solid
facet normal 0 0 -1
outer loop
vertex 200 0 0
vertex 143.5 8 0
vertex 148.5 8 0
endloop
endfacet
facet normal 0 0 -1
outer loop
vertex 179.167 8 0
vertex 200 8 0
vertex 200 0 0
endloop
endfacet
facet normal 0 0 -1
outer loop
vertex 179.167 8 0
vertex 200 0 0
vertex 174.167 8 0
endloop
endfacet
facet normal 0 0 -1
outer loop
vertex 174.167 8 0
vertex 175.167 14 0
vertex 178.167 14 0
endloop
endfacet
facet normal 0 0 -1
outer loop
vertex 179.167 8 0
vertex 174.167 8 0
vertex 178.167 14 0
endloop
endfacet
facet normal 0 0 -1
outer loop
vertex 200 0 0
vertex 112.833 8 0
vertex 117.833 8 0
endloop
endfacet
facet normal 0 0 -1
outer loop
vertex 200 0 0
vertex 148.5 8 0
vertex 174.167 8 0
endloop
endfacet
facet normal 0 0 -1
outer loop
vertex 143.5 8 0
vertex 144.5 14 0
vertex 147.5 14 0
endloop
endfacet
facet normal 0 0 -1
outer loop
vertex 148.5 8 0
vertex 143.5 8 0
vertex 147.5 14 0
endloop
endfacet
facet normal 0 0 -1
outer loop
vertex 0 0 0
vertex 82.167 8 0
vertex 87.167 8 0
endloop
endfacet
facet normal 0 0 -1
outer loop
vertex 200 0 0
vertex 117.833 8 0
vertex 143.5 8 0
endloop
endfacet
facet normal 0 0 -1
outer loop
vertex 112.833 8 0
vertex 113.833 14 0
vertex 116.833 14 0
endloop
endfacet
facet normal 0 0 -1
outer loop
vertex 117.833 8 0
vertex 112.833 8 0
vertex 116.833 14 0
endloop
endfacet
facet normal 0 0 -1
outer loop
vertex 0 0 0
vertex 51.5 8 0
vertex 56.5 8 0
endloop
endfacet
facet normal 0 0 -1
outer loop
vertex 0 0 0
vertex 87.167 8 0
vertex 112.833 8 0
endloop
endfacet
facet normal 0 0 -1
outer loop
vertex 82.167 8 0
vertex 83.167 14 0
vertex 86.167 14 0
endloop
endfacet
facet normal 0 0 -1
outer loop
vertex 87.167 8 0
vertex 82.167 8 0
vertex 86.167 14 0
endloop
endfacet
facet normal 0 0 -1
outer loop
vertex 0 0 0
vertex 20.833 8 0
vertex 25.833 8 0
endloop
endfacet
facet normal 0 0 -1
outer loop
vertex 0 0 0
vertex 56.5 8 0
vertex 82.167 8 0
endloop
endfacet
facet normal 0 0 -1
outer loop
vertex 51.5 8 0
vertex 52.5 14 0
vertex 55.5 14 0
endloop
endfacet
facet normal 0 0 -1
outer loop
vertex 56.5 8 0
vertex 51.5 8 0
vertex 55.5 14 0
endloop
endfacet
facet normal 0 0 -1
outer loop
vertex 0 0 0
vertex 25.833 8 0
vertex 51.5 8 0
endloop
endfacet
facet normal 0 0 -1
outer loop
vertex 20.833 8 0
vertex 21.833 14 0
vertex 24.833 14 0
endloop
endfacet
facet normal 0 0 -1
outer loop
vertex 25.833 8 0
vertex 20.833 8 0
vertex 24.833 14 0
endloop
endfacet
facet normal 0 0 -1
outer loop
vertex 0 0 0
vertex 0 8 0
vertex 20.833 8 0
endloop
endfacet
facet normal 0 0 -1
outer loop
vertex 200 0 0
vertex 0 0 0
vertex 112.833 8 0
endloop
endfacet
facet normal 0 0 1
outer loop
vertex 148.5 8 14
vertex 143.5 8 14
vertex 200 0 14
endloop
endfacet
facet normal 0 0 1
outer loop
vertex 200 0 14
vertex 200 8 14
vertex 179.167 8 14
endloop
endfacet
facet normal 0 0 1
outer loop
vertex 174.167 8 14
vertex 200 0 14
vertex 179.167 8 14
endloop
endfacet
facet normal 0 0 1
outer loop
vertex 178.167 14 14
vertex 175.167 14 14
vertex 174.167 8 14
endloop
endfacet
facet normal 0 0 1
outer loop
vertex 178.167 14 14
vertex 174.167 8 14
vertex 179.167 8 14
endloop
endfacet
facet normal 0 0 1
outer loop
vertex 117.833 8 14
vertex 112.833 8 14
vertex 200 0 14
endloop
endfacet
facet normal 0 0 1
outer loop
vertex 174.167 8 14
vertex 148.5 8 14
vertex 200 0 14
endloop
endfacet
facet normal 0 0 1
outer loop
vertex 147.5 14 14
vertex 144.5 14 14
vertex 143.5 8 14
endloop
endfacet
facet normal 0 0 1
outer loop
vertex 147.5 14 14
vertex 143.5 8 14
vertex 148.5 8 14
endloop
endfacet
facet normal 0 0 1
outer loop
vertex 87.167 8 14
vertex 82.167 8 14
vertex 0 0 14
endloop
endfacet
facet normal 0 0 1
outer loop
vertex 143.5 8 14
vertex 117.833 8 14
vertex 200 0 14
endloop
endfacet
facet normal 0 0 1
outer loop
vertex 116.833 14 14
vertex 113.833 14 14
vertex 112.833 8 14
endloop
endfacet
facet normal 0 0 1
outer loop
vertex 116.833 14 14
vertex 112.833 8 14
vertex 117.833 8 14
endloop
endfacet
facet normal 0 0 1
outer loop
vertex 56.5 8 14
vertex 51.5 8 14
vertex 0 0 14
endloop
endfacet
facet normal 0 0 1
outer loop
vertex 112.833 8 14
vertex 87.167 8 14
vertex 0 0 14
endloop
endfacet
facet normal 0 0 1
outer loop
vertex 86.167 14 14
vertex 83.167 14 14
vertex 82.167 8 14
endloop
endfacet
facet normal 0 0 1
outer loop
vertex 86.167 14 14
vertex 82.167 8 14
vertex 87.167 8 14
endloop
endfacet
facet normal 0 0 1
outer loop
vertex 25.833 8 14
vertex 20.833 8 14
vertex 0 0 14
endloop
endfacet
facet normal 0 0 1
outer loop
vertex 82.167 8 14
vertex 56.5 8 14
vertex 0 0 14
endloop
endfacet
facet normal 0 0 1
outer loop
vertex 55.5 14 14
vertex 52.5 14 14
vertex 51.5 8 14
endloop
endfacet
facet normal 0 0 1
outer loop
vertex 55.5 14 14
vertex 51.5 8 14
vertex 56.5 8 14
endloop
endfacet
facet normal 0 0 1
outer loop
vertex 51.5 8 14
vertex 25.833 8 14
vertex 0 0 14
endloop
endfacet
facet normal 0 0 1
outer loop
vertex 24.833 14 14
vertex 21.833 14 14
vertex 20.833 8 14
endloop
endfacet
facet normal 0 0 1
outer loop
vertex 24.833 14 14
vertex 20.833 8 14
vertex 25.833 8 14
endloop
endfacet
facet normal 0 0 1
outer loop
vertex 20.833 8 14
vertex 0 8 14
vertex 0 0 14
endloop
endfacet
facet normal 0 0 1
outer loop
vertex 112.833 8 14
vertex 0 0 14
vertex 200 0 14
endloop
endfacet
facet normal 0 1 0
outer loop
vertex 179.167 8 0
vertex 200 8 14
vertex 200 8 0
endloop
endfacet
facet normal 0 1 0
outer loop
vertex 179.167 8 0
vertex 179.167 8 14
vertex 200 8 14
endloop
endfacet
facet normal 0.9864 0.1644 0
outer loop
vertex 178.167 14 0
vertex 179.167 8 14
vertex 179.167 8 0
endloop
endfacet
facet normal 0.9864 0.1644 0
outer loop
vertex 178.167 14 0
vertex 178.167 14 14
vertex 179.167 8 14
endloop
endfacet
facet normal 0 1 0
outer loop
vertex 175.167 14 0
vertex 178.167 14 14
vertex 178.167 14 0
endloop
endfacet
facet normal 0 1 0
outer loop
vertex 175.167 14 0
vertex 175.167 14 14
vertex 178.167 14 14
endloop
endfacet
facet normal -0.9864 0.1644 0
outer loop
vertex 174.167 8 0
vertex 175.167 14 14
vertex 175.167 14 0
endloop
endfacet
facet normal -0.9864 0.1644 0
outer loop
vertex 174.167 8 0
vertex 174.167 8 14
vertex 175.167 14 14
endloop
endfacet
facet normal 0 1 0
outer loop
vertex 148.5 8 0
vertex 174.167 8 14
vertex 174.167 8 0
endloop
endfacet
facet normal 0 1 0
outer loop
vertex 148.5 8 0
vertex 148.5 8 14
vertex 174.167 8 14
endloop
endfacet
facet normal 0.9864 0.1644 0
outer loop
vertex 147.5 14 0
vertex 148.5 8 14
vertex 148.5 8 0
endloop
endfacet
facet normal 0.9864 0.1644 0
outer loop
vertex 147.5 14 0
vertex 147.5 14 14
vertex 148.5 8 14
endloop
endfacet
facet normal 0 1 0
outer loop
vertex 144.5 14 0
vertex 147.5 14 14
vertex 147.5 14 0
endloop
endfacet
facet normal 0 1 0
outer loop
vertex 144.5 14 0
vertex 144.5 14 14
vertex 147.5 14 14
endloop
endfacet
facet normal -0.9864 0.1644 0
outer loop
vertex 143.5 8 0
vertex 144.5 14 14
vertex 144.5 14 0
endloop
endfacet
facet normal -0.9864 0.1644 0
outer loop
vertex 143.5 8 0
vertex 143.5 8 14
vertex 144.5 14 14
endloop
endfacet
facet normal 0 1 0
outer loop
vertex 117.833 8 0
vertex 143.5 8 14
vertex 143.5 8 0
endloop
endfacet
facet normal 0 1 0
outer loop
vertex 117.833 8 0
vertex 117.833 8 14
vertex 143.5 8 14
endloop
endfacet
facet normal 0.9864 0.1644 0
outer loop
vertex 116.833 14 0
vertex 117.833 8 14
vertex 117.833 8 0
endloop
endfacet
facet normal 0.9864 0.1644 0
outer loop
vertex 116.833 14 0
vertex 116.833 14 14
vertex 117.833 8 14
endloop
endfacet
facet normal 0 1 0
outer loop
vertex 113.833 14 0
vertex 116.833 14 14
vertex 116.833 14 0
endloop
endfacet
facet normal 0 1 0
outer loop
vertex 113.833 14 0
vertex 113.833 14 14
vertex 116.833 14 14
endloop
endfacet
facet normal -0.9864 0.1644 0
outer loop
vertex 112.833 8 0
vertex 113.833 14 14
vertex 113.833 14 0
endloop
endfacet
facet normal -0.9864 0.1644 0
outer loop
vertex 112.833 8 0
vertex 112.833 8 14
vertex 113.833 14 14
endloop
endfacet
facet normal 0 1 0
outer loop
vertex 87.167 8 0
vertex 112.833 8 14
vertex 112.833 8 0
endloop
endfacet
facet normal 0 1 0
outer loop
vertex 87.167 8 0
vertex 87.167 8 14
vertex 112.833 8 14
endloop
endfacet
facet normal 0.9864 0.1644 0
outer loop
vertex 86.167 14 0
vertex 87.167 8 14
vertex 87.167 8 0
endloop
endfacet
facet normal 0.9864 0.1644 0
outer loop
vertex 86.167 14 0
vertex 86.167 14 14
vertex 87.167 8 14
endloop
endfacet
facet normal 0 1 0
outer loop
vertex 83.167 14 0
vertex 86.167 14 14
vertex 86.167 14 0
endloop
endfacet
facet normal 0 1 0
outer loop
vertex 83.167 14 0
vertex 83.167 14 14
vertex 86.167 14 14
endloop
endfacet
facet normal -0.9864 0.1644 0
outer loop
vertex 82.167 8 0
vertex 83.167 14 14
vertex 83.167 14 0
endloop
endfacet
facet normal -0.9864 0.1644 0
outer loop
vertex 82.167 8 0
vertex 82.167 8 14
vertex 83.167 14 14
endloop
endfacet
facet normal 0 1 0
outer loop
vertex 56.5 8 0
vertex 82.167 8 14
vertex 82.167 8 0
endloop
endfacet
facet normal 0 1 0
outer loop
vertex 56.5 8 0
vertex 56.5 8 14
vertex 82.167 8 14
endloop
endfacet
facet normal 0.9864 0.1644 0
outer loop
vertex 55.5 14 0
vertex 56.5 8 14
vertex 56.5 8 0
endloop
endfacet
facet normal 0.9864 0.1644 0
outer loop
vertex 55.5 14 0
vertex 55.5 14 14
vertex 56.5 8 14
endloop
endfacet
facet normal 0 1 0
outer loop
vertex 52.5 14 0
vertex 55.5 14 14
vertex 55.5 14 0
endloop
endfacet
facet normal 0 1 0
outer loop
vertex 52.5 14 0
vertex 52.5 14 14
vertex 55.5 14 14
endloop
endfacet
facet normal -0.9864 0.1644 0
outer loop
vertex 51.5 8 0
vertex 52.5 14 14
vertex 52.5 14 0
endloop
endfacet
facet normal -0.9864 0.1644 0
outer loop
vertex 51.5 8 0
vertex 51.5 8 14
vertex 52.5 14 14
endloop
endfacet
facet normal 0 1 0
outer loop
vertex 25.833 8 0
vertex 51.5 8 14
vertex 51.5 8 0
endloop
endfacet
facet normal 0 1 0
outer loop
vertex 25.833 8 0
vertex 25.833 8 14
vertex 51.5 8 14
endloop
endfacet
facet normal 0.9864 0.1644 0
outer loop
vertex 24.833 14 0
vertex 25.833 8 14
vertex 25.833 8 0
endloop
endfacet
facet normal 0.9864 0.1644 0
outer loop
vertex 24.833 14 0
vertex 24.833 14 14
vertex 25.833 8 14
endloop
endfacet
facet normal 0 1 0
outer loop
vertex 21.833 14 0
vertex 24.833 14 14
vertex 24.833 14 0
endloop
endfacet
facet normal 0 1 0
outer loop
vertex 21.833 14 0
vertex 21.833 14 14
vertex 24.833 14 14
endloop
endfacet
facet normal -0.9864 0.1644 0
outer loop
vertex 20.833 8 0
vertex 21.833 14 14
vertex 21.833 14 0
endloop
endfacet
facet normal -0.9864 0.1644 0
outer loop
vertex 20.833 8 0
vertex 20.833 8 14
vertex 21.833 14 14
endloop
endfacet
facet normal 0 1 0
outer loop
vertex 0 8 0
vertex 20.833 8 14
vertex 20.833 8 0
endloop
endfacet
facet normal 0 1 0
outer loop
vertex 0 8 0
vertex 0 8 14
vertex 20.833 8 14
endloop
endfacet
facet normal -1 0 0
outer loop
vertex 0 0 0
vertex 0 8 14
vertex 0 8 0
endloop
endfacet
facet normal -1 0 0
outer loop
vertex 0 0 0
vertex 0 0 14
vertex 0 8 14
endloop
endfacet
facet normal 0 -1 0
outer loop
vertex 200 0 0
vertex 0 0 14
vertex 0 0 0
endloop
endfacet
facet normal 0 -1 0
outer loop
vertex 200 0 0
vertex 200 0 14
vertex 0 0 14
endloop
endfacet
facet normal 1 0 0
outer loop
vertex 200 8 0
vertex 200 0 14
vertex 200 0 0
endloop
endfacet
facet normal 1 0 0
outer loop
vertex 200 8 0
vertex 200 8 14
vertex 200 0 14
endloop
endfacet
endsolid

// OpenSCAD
$fn = 32;

// ----------------------------------------------------------------------
// Gear rack: 6 teeth on a 200 mm bar, pitch 30.67 mm
// ----------------------------------------------------------------------

// --- parameters (mm) ---
profile_height = 14;      // extrusion height
profile_points = 28;      // points of the closed outline

profile = [[0, 0], [200, 0], [200, 8], [179.167, 8], [178.167, 14], [175.167, 14], [174.167, 8], [148.5, 8], [147.5, 14], [144.5, 14], [143.5, 8], [117.833, 8], [116.833, 14], [113.833, 14], [112.833, 8], [87.167, 8], [86.167, 14], [83.167, 14], [82.167, 8], [56.5, 8], [55.5, 14], [52.5, 14], [51.5, 8], [25.833, 8], [24.833, 14], [21.833, 14], [20.833, 8], [0, 8]];  // single closed polygon, 28 points, counter clockwise

// --- the one profile operation ---
linear_extrude(height = profile_height) polygon(points = profile);
